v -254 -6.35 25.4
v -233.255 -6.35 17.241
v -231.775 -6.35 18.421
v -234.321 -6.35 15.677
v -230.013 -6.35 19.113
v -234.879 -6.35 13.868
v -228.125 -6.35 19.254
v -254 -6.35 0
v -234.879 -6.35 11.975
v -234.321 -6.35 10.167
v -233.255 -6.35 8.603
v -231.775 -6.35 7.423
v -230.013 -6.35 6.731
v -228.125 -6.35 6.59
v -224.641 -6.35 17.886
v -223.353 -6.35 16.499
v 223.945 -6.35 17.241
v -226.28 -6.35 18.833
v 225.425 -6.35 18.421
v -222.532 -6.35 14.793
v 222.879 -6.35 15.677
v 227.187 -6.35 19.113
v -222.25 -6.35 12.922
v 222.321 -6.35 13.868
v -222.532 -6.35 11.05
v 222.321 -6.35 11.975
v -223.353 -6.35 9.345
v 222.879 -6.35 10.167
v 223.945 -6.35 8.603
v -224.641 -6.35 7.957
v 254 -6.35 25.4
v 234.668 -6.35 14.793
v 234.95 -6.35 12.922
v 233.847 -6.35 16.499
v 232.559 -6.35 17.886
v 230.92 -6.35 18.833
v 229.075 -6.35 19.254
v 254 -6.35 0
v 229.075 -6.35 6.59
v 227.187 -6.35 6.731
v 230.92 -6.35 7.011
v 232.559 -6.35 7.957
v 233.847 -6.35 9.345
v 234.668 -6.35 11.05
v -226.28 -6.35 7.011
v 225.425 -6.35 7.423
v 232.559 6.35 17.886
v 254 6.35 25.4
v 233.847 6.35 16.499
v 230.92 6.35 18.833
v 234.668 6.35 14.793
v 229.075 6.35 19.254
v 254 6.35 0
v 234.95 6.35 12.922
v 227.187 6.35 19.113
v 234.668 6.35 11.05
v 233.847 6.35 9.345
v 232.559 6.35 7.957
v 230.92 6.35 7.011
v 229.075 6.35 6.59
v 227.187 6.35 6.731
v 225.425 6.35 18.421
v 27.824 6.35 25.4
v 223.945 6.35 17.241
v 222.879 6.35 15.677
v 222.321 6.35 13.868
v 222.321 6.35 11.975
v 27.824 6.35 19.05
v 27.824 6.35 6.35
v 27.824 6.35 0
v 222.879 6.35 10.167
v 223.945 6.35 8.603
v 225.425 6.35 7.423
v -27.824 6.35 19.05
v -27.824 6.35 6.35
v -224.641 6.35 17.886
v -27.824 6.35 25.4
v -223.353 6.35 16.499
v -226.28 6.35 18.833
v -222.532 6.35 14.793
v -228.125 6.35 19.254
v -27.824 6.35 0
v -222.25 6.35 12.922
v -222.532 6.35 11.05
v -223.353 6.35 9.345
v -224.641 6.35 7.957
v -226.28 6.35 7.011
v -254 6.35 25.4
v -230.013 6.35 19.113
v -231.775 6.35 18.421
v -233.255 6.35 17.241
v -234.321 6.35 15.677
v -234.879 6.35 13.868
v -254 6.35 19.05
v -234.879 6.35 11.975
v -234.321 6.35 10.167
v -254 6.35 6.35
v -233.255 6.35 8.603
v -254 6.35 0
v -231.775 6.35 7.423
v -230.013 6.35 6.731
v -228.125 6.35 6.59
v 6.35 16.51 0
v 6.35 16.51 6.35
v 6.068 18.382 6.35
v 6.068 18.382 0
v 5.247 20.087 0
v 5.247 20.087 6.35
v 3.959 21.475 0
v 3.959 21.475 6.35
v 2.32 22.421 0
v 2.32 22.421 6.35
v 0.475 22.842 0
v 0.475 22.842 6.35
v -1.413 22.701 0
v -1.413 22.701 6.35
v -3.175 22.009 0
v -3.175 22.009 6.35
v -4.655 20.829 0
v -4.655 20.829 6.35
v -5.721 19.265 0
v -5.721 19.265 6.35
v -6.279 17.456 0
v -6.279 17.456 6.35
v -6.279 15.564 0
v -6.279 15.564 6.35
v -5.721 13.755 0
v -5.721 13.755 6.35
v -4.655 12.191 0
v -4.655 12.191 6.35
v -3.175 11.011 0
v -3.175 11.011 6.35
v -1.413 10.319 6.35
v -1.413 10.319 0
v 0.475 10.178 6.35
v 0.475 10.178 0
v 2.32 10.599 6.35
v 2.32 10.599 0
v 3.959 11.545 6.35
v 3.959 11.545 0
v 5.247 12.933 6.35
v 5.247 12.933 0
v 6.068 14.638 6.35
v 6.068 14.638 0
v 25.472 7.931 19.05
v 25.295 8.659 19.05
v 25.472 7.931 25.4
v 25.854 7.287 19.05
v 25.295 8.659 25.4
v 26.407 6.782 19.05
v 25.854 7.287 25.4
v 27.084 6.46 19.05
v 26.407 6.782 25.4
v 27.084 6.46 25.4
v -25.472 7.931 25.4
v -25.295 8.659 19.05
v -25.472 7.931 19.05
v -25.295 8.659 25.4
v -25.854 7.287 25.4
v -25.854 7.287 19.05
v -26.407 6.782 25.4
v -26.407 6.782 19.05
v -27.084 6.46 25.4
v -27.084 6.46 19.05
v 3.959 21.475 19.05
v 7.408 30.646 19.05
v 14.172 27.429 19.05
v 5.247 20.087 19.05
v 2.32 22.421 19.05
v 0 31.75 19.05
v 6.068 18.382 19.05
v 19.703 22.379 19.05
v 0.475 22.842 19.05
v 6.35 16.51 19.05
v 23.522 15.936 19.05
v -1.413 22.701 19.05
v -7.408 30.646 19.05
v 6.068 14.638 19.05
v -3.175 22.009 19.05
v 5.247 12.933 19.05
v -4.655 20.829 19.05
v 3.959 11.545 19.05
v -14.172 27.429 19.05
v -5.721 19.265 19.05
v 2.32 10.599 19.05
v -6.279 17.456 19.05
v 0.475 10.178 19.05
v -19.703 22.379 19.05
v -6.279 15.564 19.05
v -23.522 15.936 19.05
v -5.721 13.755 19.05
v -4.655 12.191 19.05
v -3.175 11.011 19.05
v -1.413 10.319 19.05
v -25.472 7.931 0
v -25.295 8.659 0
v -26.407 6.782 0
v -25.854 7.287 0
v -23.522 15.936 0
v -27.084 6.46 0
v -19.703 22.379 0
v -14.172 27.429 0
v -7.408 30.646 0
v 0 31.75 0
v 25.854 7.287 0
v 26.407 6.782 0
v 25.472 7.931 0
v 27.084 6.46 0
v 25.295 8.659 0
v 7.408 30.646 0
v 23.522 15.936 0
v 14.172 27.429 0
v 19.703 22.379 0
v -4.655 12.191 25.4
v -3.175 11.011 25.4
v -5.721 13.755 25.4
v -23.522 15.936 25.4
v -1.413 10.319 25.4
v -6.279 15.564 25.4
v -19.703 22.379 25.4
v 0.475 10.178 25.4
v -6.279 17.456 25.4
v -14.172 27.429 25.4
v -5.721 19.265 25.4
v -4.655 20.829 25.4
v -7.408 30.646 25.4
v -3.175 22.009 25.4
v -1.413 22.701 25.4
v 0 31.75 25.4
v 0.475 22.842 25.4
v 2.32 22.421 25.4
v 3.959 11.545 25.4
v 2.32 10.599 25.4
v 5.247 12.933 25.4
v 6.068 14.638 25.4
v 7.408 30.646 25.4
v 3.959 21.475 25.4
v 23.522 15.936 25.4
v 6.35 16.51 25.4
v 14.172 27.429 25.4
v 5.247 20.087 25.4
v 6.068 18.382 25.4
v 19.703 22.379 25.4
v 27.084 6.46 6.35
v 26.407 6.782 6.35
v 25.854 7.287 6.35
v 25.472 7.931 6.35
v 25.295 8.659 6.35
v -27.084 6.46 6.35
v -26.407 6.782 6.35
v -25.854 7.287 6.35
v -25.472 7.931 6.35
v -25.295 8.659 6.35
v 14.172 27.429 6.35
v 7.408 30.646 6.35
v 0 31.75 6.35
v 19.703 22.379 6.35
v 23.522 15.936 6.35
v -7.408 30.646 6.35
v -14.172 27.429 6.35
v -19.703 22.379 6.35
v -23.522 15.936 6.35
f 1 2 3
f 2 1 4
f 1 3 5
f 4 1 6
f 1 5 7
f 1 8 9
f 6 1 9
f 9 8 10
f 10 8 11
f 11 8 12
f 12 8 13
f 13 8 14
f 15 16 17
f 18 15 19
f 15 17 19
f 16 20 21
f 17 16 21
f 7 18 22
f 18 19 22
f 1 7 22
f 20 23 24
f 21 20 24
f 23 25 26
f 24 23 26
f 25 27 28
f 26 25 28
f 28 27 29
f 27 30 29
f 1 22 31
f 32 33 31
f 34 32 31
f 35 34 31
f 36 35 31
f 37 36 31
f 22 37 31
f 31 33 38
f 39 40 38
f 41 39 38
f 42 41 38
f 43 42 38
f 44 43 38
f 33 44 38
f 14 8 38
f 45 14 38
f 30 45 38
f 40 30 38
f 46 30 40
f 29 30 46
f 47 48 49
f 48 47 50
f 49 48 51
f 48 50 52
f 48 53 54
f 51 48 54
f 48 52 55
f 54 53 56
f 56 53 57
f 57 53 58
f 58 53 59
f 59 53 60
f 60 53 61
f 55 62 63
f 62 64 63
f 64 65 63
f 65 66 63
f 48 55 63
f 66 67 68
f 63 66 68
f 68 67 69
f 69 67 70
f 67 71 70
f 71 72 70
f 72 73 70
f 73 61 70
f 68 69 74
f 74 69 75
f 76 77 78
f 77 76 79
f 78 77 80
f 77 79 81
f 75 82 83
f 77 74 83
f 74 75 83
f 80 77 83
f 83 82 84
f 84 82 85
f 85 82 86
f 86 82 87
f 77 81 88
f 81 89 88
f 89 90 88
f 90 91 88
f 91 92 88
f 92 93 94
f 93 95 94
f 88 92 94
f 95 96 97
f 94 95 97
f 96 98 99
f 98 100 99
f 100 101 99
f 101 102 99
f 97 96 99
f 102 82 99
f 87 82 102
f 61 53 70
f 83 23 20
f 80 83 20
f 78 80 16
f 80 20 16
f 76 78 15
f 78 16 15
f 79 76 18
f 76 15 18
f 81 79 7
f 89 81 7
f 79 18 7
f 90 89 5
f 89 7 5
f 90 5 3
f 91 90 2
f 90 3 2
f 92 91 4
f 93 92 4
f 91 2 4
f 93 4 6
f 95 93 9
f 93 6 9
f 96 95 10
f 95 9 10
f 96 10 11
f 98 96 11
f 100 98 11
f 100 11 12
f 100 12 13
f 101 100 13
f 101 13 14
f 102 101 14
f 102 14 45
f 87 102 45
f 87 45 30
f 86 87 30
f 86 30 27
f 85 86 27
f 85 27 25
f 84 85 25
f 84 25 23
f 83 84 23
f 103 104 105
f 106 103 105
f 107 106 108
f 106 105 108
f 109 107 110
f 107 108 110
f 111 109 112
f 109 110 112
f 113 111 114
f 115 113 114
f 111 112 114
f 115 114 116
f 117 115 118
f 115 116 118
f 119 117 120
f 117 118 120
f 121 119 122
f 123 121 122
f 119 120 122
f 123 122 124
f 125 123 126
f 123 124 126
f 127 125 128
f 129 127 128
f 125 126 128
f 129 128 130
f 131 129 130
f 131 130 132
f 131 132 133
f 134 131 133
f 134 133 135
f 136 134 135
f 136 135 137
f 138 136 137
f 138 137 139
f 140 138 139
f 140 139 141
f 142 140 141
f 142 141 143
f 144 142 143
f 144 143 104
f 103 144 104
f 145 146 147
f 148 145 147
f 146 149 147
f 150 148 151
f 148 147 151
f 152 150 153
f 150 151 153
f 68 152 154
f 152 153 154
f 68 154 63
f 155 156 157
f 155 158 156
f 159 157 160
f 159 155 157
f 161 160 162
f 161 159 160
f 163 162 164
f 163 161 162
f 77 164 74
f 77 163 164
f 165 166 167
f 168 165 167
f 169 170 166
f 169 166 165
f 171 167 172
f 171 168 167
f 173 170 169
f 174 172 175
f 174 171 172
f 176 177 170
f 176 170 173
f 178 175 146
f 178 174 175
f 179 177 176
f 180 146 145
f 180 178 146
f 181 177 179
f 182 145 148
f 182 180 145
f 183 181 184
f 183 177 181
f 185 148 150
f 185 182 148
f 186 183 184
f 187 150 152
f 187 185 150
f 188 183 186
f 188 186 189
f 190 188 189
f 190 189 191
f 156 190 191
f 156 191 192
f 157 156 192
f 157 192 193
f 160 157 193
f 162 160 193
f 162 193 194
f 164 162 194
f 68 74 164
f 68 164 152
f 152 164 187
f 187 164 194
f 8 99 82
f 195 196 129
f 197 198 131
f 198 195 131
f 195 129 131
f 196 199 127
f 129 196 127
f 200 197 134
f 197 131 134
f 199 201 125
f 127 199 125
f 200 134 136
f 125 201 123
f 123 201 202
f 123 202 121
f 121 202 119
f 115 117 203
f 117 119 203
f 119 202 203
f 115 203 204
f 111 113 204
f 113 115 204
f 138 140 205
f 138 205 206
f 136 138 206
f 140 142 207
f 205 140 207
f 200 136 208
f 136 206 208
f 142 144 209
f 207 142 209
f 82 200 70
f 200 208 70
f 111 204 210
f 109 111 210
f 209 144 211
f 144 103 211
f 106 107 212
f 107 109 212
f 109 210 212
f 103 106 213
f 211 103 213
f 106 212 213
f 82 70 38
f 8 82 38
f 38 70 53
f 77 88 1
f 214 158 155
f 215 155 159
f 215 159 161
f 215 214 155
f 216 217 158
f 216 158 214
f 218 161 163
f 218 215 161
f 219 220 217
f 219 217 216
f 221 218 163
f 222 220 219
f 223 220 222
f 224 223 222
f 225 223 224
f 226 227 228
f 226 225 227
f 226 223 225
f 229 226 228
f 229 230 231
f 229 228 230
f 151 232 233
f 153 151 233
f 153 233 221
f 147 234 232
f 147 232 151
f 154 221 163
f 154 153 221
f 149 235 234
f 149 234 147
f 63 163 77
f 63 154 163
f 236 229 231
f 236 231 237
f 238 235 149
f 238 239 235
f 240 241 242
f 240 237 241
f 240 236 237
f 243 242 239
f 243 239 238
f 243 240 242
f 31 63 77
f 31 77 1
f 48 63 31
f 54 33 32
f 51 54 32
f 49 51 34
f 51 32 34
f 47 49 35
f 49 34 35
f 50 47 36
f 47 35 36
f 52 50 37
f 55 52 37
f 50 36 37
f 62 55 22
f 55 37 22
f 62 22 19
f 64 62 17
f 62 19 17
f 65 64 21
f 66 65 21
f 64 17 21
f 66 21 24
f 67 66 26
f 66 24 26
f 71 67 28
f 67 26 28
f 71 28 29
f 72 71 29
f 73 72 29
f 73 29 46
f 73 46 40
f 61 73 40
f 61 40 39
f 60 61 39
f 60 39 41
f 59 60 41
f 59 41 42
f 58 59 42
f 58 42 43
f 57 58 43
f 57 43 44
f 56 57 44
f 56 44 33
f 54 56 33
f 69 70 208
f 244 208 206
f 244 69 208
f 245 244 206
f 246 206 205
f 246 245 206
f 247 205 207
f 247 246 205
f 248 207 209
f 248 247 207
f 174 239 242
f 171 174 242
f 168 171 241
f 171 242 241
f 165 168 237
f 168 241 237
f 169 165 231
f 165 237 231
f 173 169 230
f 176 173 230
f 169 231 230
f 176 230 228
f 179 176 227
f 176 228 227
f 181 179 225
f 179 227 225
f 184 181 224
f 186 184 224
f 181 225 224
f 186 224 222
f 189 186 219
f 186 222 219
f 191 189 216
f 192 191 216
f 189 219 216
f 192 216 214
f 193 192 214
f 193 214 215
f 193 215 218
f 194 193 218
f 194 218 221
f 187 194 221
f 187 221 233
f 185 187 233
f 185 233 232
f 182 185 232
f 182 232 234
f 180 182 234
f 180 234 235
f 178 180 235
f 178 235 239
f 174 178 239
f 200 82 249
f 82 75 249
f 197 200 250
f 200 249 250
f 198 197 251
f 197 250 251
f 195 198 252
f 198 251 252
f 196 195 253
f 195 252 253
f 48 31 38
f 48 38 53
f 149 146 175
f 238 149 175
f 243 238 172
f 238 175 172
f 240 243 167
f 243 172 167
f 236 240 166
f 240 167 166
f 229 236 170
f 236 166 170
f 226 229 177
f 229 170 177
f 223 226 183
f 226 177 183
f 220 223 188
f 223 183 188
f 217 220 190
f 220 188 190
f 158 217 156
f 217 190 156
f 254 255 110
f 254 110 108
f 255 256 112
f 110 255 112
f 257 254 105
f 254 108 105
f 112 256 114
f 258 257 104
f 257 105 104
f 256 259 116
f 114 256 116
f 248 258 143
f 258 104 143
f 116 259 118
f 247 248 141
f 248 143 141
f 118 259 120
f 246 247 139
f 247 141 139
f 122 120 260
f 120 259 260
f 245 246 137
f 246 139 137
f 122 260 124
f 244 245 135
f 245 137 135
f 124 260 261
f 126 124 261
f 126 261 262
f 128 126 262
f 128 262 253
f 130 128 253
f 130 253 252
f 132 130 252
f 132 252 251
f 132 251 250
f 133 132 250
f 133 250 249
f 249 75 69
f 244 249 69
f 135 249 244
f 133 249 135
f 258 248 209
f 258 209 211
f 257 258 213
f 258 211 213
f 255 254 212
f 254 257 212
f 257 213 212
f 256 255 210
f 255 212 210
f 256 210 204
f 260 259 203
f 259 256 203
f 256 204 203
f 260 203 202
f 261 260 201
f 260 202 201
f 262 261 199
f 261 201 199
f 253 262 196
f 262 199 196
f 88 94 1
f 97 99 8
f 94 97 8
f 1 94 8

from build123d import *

# Parameters (mm, degrees)
F1_DEPTH = 25.4
F2_R     = 6.35
F3_DEPTH = 25.401
F4_W     = 41.7305262923
F4_H     = 12.7
F5_DEPTH = 508.001
F6_R     = 2.54
F7_R     = 6.35
F8_DEPTH = 38.101


with BuildPart() as f1:
    # F0 (on Top) → F1 (new body)
    with BuildSketch(Plane.XY):
        Polygon((-254, -6.35), (254, -6.35), (254, 6.35), (25.4, 6.35), (-25.4, 6.35), (-254, 6.35), align=None)
        with BuildLine():
            Line((-25.4, 6.35), (25.4, 6.35))
            ThreePointArc((25.4, 6.35), (0, 31.75), (-25.4, 6.35))
        make_face()
    extrude(amount=F1_DEPTH)

    # F2 (on face) → F3 (cut, through all)
    with BuildSketch(Plane.XY.offset(25.4)):
        with Locations((0, 16.51)):
            Circle(F2_R)
    extrude(amount=-F3_DEPTH, mode=Mode.SUBTRACT)

    # F4 (on face) → F5 (cut, through all)
    with BuildSketch(Plane(origin=(-254, 0, 0), x_dir=(0, -1, 0), z_dir=(-1, 0, 0))):
        with Locations((-27.2152631462, 12.7)):
            Rectangle(F4_W, F4_H)
    extrude(amount=-F5_DEPTH, mode=Mode.SUBTRACT)

    # F6
    f6_edges = [f1.edges().sort_by_distance(p)[0] for p in [
        (-25.4, 6.35, 3.175),
        (-25.4, 6.35, 22.225),
        (25.4, 6.35, 22.225),
        (25.4, 6.35, 3.175),
    ]]
    fillet(f6_edges, radius=F6_R)

    # F7 (on face) → F8 (cut, through all)
    with BuildSketch(Plane.XZ.offset(6.35)):
        with Locations((-228.6, 12.921767283)):
            Circle(F7_R)
        with Locations((228.6, 12.921767283)):
            Circle(F7_R)
    extrude(amount=-F8_DEPTH, mode=Mode.SUBTRACT)


solid = f1.part
